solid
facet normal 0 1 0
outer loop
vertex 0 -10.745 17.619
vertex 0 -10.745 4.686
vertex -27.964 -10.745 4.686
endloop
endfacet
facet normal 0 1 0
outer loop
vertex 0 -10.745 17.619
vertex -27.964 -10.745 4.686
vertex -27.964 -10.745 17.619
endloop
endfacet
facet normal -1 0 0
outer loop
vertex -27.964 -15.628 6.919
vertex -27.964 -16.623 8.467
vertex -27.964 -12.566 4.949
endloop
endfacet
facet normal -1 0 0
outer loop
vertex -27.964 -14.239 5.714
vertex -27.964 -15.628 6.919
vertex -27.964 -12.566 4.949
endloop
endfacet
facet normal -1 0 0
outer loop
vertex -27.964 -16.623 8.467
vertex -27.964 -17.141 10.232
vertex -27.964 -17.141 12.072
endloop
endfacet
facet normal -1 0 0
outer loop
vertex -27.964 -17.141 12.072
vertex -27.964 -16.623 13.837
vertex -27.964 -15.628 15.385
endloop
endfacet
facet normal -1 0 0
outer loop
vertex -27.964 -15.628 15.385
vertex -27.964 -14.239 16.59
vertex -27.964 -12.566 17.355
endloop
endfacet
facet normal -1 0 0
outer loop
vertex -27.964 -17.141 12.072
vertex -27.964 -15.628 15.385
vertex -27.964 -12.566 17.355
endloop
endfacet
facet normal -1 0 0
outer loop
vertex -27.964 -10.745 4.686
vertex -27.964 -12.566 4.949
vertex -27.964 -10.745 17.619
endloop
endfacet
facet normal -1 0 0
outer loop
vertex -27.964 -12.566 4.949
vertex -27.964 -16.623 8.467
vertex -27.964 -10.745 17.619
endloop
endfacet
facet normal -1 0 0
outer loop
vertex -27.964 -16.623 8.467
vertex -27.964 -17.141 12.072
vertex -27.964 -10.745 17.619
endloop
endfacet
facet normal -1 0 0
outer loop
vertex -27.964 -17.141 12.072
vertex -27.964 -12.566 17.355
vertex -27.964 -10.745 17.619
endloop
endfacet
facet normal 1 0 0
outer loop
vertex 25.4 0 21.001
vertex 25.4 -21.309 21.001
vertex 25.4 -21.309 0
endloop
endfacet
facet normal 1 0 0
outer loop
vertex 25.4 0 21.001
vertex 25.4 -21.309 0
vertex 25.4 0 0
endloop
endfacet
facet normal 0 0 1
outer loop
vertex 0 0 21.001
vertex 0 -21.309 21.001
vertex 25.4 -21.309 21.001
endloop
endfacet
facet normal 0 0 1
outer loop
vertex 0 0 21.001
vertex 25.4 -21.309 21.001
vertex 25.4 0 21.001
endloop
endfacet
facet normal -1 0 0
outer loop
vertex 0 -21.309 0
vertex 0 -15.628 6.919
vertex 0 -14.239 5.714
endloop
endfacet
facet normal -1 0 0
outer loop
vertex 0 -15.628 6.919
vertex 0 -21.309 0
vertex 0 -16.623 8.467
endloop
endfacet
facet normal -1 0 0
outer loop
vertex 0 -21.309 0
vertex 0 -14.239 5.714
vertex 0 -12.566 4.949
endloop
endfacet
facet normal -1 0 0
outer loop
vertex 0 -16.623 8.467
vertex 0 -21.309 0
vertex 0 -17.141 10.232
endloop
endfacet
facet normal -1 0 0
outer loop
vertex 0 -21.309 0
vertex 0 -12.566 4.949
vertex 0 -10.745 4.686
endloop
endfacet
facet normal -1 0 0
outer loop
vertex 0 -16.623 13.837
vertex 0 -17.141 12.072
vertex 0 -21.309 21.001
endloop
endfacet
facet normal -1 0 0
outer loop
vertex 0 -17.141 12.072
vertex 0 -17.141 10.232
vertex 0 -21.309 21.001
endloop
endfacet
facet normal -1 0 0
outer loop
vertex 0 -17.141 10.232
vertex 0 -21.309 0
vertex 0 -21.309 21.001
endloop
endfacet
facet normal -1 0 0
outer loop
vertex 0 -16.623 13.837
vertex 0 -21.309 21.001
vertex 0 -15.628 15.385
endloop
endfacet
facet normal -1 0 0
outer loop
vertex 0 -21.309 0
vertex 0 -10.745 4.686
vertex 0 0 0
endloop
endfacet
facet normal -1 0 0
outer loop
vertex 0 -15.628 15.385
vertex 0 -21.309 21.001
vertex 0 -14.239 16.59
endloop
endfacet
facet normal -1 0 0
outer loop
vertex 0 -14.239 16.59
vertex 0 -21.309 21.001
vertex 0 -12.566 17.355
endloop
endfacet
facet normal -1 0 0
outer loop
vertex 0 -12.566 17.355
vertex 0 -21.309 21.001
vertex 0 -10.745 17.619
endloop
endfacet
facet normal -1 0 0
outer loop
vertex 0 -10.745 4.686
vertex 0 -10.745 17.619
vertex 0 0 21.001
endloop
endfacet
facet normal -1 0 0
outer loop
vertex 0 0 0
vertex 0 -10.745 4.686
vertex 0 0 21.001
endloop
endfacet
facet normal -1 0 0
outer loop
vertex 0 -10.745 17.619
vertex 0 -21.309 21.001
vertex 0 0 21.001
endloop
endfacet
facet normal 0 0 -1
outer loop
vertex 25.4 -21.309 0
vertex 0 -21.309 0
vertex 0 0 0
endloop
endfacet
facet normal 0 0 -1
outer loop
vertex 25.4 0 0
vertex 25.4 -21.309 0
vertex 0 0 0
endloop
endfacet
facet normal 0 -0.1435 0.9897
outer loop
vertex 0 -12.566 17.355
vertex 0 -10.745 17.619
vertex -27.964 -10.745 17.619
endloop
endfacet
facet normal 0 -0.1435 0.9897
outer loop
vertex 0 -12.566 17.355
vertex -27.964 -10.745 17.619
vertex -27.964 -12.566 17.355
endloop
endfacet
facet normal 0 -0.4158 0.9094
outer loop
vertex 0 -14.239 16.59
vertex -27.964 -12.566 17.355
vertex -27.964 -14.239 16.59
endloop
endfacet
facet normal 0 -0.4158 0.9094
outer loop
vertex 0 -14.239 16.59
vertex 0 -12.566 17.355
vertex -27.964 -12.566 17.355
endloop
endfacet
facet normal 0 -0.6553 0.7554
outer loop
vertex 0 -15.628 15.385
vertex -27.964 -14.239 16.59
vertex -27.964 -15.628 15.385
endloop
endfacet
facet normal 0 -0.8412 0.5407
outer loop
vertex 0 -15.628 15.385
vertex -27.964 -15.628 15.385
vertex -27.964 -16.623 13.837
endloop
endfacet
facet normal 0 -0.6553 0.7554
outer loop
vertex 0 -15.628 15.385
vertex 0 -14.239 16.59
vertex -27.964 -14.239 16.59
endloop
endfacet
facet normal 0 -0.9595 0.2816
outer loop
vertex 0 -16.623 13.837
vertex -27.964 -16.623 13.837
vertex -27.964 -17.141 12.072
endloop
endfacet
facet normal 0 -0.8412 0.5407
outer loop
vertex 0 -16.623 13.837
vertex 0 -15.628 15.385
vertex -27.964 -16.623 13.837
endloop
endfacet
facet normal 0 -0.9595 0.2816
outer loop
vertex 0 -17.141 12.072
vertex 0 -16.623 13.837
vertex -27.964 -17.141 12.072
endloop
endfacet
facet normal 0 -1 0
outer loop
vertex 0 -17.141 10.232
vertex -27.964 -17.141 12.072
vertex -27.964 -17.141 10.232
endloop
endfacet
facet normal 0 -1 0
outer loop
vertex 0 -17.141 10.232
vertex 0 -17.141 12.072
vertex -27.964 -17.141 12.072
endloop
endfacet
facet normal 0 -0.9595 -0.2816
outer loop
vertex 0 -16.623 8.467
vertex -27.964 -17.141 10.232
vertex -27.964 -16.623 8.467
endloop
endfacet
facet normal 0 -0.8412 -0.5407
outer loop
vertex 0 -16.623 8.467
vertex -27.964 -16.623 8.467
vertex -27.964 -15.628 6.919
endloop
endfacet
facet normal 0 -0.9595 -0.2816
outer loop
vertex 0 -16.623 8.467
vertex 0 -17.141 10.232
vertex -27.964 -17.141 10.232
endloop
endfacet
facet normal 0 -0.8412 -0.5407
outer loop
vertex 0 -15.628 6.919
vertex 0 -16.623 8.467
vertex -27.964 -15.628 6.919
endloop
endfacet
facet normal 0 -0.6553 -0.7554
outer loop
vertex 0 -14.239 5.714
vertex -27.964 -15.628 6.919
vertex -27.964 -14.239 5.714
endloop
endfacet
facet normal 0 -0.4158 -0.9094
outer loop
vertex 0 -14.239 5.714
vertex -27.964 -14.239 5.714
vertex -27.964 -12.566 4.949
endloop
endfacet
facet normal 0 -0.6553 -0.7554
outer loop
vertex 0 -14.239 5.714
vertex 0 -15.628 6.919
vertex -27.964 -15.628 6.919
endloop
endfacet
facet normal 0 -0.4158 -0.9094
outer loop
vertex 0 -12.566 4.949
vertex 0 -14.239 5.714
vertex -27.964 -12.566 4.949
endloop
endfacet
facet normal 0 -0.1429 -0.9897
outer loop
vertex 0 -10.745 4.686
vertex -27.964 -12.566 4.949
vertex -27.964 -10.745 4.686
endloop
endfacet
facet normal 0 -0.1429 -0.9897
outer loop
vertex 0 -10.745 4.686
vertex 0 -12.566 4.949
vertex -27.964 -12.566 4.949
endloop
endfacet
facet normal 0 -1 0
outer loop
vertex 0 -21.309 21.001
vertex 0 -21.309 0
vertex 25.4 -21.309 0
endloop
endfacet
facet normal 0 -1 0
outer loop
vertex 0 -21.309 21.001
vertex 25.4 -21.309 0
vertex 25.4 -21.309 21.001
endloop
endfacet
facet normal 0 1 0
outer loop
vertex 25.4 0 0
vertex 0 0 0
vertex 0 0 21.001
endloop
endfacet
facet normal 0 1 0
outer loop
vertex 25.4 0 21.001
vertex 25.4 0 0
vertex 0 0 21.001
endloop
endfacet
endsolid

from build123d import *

# Parameters (mm, degrees)
F0_W     = 21.3086809963
F0_H     = 21.0013445467
F1_DEPTH = 25.4
F3_DEPTH = 53.3642210066


with BuildPart() as f1:
    # F0 (on Right) → F1 (new body)
    with BuildSketch(Plane.YZ):
        with Locations((-10.6543404981, 10.5006722733)):
            Rectangle(F0_W, F0_H)
    extrude(amount=F1_DEPTH)

    # F2 (on face) → F3 (join)
    with BuildSketch(Plane.YZ.offset(25.4)):
        with BuildLine():
            Line((-10.7450820506, 4.6855835698), (-10.7450820506, 17.6185862639))
            ThreePointArc((-10.7450820506, 17.6185862639), (-17.2063226354, 11.1520849168), (-10.7450820506, 4.6855835698))
        make_face()
    extrude(amount=-F3_DEPTH)


solid = f1.part
